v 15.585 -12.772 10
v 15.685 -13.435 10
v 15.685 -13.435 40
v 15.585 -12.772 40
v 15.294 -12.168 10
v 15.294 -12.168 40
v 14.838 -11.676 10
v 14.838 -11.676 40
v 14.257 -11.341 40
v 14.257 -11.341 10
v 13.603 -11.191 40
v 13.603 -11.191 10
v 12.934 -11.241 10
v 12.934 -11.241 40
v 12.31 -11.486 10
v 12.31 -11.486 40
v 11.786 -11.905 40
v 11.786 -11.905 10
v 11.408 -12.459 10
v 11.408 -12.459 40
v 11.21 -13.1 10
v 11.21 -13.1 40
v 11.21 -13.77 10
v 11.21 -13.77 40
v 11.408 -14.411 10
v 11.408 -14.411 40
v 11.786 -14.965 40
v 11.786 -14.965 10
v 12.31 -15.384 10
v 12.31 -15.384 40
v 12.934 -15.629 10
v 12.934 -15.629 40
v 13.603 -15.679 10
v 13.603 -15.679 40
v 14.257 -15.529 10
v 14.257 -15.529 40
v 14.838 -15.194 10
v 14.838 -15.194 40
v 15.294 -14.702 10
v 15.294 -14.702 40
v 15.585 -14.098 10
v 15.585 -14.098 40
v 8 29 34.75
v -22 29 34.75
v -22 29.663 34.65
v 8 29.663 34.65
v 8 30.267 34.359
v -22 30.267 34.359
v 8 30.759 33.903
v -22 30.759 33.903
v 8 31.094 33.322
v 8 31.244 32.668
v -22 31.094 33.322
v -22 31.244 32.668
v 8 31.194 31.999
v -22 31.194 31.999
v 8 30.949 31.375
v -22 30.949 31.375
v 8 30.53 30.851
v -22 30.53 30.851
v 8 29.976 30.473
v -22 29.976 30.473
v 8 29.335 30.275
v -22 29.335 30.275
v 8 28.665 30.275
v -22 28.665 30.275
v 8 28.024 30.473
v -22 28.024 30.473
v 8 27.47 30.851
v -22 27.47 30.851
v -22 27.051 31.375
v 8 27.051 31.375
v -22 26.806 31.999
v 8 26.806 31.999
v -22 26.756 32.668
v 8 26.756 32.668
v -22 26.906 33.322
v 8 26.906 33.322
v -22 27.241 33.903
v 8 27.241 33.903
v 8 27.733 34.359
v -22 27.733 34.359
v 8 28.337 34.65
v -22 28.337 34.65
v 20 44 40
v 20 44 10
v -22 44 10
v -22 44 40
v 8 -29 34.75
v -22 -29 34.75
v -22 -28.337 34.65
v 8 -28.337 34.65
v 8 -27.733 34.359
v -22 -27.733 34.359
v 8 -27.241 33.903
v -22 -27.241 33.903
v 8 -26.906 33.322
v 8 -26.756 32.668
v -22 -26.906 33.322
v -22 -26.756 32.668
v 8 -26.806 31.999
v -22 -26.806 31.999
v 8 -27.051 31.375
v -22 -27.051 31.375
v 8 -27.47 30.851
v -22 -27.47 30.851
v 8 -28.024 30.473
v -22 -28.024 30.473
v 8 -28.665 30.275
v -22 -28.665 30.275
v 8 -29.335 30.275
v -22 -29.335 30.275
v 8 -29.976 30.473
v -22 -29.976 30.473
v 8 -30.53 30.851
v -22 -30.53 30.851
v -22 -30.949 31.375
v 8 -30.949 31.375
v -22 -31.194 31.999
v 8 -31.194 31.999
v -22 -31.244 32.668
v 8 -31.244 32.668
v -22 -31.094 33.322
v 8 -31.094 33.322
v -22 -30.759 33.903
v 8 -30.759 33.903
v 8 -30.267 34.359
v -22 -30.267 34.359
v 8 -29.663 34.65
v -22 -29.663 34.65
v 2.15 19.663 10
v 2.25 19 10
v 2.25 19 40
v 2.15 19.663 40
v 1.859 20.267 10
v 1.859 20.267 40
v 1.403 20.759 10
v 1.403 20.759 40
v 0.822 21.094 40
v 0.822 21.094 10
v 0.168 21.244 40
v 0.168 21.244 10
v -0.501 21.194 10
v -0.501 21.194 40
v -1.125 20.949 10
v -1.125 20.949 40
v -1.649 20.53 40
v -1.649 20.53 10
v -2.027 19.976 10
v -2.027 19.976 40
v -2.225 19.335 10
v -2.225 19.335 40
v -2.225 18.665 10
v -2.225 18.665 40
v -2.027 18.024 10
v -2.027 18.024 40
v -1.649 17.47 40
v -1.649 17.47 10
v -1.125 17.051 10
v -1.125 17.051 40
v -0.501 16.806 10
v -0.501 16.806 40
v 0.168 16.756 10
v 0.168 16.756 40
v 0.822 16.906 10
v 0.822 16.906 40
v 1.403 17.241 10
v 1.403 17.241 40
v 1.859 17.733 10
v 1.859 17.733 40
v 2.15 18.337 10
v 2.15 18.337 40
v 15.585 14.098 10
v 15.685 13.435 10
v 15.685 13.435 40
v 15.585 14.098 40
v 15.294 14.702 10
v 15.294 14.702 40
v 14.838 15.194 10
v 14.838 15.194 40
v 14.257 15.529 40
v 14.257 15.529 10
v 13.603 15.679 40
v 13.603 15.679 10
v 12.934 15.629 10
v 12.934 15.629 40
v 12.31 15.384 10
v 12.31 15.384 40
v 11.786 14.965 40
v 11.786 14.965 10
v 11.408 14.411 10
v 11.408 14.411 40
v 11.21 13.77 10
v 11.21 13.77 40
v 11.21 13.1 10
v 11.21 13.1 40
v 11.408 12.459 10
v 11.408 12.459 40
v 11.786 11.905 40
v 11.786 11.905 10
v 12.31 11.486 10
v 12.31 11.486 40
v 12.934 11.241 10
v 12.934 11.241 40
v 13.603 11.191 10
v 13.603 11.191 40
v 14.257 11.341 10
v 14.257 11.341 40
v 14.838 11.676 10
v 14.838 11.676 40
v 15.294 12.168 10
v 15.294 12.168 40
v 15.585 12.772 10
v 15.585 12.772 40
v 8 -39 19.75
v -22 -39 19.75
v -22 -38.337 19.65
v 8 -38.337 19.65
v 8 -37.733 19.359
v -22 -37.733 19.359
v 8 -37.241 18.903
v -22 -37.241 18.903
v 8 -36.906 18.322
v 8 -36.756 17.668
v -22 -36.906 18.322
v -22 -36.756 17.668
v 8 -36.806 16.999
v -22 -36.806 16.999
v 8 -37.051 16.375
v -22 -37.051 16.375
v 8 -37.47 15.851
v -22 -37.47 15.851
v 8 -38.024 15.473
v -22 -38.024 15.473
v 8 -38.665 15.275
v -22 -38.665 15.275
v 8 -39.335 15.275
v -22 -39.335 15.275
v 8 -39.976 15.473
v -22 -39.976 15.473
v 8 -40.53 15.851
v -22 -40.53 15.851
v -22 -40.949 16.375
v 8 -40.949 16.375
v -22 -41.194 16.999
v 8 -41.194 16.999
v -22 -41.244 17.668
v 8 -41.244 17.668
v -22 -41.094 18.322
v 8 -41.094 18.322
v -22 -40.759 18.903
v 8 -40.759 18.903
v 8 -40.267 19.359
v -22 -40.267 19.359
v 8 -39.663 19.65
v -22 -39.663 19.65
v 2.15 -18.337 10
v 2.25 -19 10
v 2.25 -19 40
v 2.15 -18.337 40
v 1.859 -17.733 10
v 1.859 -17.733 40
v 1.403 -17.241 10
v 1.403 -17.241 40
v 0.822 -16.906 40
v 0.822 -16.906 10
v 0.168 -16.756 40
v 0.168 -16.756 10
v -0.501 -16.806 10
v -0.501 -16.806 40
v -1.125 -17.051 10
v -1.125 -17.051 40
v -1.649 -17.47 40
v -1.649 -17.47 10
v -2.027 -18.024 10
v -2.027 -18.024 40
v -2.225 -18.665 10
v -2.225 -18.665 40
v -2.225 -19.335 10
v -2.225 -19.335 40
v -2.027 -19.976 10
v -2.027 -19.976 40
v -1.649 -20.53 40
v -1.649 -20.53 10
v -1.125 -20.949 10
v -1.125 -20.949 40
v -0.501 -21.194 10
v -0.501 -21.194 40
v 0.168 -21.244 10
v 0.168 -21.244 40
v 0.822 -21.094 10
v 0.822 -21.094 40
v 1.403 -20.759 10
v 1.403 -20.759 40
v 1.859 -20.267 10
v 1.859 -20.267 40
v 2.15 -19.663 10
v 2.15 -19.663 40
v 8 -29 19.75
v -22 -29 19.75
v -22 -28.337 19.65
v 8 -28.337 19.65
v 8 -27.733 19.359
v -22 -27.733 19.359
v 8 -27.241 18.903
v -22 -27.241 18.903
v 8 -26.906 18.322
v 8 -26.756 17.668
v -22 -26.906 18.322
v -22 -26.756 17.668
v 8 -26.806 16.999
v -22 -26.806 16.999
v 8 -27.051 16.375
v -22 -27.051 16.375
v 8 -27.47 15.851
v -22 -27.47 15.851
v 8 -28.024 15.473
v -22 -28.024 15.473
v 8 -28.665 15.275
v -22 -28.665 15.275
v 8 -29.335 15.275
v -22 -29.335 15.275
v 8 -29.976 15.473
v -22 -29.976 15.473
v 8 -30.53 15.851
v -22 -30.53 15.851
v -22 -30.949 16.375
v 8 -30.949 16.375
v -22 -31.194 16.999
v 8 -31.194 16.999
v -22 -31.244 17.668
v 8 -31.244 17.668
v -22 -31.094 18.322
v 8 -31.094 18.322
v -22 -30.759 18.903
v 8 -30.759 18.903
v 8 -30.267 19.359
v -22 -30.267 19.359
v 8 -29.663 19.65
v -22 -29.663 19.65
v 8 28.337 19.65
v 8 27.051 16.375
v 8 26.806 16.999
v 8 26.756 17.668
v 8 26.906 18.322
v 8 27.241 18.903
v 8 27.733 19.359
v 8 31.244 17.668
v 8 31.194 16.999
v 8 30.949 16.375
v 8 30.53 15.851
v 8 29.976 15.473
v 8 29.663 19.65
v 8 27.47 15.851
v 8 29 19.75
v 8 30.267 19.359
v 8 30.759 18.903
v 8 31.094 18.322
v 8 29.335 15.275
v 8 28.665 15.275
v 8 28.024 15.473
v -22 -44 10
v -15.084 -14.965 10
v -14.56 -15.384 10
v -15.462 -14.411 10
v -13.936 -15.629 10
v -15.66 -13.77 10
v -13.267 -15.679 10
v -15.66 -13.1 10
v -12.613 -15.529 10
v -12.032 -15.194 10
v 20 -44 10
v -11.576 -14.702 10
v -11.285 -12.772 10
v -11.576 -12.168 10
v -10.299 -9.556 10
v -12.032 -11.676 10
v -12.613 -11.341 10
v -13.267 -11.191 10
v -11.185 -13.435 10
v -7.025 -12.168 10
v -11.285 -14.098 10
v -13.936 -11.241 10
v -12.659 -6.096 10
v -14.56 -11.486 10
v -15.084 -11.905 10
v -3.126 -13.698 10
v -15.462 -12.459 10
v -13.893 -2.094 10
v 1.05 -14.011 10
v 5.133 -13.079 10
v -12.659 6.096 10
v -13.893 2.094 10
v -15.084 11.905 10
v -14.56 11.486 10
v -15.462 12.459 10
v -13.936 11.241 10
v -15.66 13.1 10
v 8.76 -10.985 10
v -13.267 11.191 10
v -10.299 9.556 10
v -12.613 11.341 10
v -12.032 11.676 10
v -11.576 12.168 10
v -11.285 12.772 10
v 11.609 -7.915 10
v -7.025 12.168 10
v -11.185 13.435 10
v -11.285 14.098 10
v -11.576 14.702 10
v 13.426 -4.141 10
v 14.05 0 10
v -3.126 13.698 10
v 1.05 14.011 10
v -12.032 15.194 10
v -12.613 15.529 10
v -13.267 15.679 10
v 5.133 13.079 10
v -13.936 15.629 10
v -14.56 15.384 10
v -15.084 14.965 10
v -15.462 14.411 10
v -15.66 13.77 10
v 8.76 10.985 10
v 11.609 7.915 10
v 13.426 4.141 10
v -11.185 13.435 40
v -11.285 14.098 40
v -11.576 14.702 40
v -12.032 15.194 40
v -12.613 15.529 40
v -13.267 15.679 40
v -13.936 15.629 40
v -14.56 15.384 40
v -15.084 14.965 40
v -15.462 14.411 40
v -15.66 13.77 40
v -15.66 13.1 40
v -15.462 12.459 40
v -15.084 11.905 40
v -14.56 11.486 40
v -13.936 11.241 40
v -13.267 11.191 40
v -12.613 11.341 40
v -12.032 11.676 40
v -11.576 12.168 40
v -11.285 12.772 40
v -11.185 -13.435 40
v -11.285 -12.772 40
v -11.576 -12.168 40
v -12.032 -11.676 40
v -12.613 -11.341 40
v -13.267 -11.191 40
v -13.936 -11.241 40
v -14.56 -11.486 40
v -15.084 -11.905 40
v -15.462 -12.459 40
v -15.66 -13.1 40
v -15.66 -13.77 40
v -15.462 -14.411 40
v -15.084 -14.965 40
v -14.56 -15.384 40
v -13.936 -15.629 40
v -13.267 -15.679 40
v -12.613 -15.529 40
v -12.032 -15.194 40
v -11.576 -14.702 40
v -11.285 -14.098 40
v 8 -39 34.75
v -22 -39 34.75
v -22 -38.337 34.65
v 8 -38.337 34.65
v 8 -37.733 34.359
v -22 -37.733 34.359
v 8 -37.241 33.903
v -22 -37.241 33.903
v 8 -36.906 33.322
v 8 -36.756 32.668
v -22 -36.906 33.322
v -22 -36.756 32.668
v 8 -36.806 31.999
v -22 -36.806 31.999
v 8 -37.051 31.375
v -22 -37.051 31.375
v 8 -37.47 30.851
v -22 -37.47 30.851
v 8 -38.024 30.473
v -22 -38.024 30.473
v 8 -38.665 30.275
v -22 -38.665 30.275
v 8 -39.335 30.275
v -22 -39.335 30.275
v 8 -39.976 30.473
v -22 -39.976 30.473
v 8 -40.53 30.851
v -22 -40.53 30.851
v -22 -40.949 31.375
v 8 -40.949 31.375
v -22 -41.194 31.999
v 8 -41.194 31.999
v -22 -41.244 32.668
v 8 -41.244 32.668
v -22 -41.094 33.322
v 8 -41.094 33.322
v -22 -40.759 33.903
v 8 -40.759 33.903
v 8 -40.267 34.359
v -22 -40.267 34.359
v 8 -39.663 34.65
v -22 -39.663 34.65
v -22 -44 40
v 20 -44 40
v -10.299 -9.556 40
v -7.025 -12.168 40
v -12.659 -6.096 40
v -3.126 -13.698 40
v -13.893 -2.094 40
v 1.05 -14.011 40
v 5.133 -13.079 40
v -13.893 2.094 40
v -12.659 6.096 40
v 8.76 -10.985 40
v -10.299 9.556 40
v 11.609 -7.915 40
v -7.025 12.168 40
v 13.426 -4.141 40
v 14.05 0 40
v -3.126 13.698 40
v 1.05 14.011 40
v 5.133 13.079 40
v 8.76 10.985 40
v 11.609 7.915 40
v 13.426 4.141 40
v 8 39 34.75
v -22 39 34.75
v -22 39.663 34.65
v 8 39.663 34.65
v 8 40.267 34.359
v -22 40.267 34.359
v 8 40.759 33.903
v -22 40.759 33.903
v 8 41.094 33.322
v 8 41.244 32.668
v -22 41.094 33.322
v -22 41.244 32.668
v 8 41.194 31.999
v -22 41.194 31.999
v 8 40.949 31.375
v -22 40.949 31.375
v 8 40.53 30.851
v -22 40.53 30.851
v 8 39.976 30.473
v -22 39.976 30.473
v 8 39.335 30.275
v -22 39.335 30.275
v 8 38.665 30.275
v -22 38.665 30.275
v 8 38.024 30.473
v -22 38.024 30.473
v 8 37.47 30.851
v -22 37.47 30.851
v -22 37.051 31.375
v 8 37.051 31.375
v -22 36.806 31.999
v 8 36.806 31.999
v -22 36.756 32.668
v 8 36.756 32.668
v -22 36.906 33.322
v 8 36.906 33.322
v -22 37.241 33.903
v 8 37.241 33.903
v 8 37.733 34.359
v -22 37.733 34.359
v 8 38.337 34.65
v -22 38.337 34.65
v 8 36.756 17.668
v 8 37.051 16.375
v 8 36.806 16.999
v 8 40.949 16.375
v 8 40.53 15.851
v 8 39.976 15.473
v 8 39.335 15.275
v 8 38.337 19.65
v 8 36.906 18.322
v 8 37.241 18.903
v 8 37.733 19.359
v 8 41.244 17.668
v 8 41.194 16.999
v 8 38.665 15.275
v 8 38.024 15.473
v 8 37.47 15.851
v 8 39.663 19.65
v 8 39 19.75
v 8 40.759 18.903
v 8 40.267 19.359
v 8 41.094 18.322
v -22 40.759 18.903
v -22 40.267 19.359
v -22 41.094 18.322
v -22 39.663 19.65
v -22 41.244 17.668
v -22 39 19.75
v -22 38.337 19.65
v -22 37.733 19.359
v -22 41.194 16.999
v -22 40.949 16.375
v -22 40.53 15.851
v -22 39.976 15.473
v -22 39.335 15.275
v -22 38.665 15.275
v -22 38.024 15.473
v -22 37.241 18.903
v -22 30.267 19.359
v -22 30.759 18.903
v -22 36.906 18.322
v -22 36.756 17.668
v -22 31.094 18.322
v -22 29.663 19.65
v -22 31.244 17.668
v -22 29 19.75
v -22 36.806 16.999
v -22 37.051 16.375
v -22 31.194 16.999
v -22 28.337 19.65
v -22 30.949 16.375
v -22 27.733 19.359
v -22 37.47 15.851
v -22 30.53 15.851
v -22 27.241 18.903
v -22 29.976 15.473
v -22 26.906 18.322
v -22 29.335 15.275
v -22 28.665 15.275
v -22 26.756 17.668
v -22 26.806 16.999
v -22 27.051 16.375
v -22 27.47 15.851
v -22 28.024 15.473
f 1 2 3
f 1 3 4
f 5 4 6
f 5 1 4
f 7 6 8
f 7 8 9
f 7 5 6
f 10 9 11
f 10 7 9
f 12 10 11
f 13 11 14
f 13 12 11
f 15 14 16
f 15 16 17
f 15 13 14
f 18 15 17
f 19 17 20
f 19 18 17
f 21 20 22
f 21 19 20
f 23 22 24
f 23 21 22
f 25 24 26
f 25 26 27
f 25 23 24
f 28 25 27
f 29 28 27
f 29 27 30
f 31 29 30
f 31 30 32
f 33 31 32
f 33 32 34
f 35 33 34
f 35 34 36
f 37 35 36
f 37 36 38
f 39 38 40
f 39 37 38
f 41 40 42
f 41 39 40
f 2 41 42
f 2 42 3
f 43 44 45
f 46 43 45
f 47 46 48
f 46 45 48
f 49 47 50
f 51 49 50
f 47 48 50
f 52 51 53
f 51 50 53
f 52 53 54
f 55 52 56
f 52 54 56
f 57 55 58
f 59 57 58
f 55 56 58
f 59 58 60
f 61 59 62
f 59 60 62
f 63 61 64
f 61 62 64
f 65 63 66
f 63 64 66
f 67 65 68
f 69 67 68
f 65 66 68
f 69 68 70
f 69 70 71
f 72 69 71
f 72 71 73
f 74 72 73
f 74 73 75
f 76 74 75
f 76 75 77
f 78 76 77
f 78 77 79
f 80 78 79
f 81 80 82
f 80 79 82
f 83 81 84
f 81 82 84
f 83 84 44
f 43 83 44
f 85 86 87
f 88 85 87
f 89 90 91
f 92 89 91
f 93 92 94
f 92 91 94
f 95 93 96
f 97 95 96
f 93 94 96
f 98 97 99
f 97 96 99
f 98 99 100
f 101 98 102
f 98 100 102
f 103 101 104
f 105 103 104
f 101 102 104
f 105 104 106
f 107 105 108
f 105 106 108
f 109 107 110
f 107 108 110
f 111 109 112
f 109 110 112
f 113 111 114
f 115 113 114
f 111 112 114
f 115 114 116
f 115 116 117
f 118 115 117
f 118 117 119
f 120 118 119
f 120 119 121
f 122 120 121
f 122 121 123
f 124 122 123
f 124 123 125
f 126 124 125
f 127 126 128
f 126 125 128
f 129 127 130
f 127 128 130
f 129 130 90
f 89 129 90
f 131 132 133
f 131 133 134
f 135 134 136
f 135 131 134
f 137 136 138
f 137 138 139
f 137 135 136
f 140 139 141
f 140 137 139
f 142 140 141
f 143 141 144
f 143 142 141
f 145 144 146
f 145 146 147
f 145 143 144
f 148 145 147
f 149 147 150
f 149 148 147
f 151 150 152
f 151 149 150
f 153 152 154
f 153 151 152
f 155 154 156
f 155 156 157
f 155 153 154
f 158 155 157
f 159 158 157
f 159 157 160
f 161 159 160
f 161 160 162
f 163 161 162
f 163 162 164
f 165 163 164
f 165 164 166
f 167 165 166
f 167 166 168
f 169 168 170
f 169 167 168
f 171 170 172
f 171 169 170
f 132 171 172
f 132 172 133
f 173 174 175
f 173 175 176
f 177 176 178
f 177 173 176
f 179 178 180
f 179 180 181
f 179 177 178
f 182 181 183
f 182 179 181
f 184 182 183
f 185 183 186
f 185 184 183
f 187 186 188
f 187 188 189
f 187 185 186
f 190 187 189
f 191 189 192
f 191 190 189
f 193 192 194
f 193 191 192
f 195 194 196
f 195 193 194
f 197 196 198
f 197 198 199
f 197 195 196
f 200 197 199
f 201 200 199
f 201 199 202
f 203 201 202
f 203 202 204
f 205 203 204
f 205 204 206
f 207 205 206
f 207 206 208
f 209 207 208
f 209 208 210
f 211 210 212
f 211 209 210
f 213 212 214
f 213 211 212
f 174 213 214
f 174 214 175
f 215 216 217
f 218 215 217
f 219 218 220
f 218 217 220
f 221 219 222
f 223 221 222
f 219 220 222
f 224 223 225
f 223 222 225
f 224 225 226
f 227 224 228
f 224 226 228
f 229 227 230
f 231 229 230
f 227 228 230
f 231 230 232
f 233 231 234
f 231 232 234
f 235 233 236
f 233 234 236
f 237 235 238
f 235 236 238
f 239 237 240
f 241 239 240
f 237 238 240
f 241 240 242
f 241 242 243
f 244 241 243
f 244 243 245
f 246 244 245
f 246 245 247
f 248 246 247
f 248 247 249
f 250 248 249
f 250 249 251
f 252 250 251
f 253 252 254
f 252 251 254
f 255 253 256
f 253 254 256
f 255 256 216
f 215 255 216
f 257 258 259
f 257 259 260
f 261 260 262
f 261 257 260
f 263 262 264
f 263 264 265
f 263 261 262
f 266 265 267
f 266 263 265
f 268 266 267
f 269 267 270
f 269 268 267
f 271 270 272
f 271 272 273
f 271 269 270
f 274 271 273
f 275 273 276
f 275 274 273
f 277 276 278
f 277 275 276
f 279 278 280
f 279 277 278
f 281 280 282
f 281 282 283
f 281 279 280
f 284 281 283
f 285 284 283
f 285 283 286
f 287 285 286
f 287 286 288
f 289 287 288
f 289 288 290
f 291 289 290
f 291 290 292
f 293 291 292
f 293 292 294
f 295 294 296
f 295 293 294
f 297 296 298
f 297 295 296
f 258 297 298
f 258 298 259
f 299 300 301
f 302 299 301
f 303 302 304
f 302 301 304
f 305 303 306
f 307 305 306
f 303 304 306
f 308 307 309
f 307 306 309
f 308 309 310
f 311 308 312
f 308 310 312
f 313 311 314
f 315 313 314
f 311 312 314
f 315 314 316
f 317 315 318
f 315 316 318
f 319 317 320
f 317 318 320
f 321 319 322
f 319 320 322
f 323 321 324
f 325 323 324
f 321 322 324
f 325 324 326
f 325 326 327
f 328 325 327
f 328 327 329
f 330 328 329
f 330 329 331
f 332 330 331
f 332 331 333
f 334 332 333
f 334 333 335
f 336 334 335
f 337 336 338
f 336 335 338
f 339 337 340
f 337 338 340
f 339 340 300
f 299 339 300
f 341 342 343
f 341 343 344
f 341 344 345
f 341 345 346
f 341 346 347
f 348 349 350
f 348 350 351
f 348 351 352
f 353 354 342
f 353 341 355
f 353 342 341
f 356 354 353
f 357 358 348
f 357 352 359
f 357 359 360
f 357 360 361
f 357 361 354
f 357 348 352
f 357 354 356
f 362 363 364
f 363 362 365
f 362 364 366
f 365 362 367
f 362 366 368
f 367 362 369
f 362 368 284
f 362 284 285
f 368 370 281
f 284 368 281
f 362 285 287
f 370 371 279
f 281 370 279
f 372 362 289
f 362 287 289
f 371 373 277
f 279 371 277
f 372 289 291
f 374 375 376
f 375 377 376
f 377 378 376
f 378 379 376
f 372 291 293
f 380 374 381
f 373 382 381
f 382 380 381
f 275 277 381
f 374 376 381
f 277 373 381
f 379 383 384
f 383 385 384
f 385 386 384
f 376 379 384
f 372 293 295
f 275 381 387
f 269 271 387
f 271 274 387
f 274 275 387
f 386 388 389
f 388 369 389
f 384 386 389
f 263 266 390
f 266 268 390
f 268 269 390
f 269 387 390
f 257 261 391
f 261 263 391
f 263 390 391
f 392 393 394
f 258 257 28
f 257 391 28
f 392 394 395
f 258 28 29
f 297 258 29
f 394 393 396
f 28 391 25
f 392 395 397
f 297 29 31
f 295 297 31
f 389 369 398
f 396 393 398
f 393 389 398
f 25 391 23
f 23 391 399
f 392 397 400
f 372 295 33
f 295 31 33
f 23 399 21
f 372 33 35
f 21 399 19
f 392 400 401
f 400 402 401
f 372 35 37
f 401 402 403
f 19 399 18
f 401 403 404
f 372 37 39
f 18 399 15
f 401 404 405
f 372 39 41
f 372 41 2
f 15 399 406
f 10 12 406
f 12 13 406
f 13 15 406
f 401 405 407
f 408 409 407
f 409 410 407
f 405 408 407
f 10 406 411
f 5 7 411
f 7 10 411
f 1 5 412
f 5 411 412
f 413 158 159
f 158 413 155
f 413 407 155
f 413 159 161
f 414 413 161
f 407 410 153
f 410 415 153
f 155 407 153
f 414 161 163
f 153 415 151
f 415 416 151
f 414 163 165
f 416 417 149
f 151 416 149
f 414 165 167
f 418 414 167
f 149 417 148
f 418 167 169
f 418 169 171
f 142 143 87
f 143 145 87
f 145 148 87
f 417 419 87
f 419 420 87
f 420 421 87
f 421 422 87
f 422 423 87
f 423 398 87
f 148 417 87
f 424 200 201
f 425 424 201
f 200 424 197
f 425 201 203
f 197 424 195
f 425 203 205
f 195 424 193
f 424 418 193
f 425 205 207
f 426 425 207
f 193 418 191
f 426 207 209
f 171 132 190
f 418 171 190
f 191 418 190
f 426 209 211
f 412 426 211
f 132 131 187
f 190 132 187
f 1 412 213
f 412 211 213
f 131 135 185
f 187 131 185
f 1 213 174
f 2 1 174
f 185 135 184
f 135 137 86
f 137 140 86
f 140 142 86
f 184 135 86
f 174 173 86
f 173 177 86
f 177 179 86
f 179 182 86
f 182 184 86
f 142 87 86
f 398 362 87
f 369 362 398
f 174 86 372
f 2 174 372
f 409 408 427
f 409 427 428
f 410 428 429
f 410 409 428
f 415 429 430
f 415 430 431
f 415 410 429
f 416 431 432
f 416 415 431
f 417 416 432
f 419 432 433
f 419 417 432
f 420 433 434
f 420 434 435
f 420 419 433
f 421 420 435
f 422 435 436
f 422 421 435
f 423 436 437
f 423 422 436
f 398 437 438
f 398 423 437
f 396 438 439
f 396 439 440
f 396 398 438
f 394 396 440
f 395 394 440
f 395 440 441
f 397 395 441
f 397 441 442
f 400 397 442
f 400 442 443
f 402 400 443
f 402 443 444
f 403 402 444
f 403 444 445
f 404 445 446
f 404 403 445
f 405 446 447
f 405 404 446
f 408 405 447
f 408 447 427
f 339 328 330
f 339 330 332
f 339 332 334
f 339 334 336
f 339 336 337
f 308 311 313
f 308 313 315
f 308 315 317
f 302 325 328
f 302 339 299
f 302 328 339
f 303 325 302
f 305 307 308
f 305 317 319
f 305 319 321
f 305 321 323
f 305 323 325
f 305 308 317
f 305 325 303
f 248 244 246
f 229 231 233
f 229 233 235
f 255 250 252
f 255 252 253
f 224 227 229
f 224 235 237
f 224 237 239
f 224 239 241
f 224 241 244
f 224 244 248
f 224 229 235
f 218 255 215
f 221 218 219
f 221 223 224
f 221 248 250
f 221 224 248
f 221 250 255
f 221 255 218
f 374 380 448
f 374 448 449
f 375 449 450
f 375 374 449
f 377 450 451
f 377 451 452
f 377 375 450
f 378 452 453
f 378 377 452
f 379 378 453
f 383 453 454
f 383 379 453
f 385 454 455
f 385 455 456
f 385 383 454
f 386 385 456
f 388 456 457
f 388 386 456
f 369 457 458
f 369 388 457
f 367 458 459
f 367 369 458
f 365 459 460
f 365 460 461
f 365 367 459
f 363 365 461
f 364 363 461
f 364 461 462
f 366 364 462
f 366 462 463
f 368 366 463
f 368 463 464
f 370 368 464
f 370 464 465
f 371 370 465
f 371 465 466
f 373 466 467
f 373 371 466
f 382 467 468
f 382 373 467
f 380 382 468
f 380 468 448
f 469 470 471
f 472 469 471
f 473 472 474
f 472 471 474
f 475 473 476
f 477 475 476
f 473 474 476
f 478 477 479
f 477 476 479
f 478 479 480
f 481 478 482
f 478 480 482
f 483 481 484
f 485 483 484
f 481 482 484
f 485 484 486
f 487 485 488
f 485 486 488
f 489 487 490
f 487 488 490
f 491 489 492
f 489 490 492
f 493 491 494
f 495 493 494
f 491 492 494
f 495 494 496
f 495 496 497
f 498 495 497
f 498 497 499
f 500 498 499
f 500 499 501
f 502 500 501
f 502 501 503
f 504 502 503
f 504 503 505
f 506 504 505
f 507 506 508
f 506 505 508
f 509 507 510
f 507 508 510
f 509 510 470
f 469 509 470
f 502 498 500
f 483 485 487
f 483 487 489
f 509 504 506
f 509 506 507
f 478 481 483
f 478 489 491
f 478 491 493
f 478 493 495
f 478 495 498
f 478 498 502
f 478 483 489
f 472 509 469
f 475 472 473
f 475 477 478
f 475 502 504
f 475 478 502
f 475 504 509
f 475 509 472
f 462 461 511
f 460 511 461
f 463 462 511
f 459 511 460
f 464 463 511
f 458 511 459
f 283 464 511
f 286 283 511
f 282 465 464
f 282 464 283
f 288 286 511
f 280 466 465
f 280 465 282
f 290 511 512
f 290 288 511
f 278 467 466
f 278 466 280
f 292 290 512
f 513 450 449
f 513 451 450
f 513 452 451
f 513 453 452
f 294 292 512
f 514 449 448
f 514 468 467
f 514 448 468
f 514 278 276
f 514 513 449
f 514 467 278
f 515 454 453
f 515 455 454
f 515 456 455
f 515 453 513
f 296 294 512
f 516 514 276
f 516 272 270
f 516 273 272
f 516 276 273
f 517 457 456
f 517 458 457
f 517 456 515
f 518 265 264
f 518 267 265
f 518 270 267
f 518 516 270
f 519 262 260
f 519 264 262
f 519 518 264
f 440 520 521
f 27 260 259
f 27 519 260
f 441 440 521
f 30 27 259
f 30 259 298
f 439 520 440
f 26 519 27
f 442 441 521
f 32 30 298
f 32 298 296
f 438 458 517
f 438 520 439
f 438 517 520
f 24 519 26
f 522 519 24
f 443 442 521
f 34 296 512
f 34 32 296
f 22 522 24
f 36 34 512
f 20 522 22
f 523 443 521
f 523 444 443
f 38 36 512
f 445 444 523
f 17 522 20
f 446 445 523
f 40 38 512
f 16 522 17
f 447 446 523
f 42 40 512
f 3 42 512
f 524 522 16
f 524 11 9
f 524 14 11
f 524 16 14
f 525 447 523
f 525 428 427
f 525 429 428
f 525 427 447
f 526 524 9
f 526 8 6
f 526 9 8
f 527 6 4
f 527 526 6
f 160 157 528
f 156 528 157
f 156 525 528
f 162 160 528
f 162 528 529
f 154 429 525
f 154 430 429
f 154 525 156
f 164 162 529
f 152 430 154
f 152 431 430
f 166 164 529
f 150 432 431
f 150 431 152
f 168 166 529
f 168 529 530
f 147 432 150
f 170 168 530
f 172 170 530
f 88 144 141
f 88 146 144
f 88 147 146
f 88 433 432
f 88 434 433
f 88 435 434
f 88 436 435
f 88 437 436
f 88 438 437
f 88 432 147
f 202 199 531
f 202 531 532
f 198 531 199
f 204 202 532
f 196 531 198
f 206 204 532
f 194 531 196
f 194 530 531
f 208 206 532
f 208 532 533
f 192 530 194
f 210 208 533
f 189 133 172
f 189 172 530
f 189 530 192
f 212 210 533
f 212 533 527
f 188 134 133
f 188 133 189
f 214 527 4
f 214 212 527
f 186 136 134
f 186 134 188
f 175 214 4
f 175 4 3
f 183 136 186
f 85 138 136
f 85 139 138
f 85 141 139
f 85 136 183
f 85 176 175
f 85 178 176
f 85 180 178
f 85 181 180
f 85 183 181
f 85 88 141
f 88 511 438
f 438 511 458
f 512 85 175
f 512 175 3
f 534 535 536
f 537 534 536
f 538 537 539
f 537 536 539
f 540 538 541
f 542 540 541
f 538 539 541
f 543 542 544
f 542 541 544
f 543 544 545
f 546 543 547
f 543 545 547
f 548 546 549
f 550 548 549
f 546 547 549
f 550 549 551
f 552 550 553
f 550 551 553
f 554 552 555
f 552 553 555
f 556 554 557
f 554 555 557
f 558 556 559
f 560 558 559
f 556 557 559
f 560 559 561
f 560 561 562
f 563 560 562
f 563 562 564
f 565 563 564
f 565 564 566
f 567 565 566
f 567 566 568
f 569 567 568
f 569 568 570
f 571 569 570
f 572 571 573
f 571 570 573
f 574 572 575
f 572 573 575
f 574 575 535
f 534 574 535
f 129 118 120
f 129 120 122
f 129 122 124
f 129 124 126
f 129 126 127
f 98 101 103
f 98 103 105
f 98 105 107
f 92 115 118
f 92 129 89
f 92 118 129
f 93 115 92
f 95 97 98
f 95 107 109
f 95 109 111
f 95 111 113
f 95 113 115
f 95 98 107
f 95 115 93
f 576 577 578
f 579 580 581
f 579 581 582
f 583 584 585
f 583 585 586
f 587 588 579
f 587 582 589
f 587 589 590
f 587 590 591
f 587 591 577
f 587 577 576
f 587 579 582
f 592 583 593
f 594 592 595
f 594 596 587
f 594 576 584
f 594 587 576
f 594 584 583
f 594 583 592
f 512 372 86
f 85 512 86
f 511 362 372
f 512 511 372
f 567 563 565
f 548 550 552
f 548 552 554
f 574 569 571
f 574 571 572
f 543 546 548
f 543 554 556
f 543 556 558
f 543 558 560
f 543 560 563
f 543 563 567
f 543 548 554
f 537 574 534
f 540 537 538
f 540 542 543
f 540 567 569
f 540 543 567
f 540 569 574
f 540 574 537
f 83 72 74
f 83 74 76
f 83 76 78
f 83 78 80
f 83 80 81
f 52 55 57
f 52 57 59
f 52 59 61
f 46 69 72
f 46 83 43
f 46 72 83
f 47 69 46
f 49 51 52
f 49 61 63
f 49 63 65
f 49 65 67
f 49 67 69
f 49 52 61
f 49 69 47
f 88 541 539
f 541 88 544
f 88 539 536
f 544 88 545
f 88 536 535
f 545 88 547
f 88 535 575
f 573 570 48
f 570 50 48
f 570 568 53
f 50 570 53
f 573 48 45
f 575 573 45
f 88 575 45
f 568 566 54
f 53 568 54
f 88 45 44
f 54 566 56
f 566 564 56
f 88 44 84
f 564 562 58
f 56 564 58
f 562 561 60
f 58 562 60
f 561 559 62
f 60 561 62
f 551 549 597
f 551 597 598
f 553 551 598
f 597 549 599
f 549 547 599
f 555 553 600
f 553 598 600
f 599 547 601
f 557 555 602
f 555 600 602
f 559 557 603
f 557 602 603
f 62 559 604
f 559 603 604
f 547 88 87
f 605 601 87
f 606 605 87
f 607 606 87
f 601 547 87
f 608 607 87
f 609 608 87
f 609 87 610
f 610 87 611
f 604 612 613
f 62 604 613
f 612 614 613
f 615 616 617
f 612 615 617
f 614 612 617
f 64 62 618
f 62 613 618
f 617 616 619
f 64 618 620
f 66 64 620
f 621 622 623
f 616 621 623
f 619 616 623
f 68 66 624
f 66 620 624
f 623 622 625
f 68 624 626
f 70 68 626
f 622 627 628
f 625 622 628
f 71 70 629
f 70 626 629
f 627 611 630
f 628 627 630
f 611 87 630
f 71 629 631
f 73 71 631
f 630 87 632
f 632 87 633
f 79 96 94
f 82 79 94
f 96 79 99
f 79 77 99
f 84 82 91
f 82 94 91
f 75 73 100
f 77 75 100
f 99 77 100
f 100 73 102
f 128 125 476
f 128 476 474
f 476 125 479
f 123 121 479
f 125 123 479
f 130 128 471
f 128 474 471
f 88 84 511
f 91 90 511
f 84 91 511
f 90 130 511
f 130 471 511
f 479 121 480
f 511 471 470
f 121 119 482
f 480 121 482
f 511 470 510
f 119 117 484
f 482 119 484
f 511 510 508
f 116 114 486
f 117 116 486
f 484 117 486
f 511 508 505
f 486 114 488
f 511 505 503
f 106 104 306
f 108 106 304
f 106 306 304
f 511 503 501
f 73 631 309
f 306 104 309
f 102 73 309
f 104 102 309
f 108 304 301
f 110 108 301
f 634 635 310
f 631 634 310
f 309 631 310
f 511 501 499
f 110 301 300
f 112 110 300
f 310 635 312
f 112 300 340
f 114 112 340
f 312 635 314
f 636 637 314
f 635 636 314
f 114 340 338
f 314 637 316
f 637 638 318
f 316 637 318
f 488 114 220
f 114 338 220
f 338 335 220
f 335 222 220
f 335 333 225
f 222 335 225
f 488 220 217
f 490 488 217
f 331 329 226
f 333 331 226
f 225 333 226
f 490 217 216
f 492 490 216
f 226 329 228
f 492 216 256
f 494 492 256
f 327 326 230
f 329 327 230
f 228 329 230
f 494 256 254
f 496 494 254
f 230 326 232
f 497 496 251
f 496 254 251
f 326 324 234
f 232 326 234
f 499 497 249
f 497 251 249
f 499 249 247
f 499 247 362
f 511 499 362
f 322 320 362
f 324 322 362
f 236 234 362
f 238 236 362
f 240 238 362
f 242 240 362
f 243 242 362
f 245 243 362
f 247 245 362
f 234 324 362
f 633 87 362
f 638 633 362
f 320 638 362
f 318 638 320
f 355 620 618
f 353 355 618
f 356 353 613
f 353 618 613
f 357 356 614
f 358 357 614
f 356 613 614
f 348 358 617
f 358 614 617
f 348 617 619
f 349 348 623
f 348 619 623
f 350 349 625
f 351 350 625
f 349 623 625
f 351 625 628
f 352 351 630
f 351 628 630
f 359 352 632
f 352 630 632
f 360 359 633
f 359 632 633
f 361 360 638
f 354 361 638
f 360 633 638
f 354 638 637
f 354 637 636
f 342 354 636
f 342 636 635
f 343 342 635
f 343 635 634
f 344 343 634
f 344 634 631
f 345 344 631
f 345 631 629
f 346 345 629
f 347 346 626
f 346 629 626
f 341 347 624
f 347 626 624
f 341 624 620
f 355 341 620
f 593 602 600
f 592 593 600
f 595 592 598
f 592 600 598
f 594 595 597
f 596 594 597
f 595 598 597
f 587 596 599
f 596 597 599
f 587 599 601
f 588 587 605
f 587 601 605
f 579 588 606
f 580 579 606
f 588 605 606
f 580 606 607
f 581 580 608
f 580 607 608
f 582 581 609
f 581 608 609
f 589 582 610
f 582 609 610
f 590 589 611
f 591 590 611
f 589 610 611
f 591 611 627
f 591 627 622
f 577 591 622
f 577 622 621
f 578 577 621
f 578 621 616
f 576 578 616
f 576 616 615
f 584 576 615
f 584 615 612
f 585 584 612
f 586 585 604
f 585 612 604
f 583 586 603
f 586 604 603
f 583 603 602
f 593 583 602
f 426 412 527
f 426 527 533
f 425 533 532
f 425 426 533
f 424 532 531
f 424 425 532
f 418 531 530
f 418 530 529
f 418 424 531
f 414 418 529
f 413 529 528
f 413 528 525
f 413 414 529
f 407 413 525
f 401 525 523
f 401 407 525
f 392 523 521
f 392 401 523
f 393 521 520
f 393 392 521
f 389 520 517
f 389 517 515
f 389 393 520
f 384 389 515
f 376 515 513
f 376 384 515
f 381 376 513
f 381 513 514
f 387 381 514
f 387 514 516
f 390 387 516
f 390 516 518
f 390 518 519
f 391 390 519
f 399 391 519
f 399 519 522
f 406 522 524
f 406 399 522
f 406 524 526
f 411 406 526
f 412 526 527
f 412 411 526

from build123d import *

# Parameters (mm, degrees)
EXTRUDE7_START     = 10
SKETCH1_R          = 2.25
SKETCH1_R_2        = 14.05
EXTRUDE7_DEPTH     = 30
CUT_EXTRUDE6_START = 2
SKETCH8_R          = 2.25
CUT_EXTRUDE6_DEPTH = 30


with BuildPart() as part:
    # Sketch1 → Extrude7 (new body)
    with BuildSketch(Plane.XY.offset(EXTRUDE7_START)):
        Polygon((20, 44), (-20, 44), (-22, 44), (-22, -44), (-20, -44), (20, -44), align=None)
        with Locations((-13.435028843, -13.435028843)):
            Circle(SKETCH1_R, mode=Mode.SUBTRACT)
        with Locations((0, -19)):
            Circle(SKETCH1_R, mode=Mode.SUBTRACT)
        with Locations((13.435028843, -13.435028843)):
            Circle(SKETCH1_R, mode=Mode.SUBTRACT)
        with Locations((-13.435028843, 13.435028843)):
            Circle(SKETCH1_R, mode=Mode.SUBTRACT)
        Circle(SKETCH1_R_2, mode=Mode.SUBTRACT)
        with Locations((0, 19)):
            Circle(SKETCH1_R, mode=Mode.SUBTRACT)
        with Locations((13.435028843, 13.435028843)):
            Circle(SKETCH1_R, mode=Mode.SUBTRACT)
        Polygon((20, 44), (-20, 44), (-22, 44), (-22, -44), (-20, -44), (20, -44), align=None)
        with Locations((-13.435028843, -13.435028843)):
            Circle(SKETCH1_R, mode=Mode.SUBTRACT)
        with Locations((0, -19)):
            Circle(SKETCH1_R, mode=Mode.SUBTRACT)
        with Locations((13.435028843, -13.435028843)):
            Circle(SKETCH1_R, mode=Mode.SUBTRACT)
        with Locations((-13.435028843, 13.435028843)):
            Circle(SKETCH1_R, mode=Mode.SUBTRACT)
        Circle(SKETCH1_R_2, mode=Mode.SUBTRACT)
        with Locations((0, 19)):
            Circle(SKETCH1_R, mode=Mode.SUBTRACT)
        with Locations((13.435028843, 13.435028843)):
            Circle(SKETCH1_R, mode=Mode.SUBTRACT)
        Polygon((20, 44), (-20, 44), (-22, 44), (-22, -44), (-20, -44), (20, -44), align=None)
        with Locations((-13.435028843, -13.435028843)):
            Circle(SKETCH1_R, mode=Mode.SUBTRACT)
        with Locations((0, -19)):
            Circle(SKETCH1_R, mode=Mode.SUBTRACT)
        with Locations((13.435028843, -13.435028843)):
            Circle(SKETCH1_R, mode=Mode.SUBTRACT)
        with Locations((-13.435028843, 13.435028843)):
            Circle(SKETCH1_R, mode=Mode.SUBTRACT)
        Circle(SKETCH1_R_2, mode=Mode.SUBTRACT)
        with Locations((0, 19)):
            Circle(SKETCH1_R, mode=Mode.SUBTRACT)
        with Locations((13.435028843, 13.435028843)):
            Circle(SKETCH1_R, mode=Mode.SUBTRACT)
    extrude(amount=EXTRUDE7_DEPTH)

    # Sketch8 → Cut-Extrude6 (cut)
    with BuildSketch(Plane.ZY.offset(20).offset(CUT_EXTRUDE6_START)):
        with Locations((17.5, 39)):
            Circle(SKETCH8_R)
        with Locations((32.5, 39)):
            Circle(SKETCH8_R)
        with Locations((17.5, -39)):
            Circle(SKETCH8_R)
        with Locations((32.5, -39)):
            Circle(SKETCH8_R)
        with Locations((17.5, 29)):
            Circle(SKETCH8_R)
        with Locations((32.5, 29)):
            Circle(SKETCH8_R)
        with Locations((17.5, -29)):
            Circle(SKETCH8_R)
        with Locations((32.5, -29)):
            Circle(SKETCH8_R)
    extrude(amount=-CUT_EXTRUDE6_DEPTH, mode=Mode.SUBTRACT)


solid = part.part
